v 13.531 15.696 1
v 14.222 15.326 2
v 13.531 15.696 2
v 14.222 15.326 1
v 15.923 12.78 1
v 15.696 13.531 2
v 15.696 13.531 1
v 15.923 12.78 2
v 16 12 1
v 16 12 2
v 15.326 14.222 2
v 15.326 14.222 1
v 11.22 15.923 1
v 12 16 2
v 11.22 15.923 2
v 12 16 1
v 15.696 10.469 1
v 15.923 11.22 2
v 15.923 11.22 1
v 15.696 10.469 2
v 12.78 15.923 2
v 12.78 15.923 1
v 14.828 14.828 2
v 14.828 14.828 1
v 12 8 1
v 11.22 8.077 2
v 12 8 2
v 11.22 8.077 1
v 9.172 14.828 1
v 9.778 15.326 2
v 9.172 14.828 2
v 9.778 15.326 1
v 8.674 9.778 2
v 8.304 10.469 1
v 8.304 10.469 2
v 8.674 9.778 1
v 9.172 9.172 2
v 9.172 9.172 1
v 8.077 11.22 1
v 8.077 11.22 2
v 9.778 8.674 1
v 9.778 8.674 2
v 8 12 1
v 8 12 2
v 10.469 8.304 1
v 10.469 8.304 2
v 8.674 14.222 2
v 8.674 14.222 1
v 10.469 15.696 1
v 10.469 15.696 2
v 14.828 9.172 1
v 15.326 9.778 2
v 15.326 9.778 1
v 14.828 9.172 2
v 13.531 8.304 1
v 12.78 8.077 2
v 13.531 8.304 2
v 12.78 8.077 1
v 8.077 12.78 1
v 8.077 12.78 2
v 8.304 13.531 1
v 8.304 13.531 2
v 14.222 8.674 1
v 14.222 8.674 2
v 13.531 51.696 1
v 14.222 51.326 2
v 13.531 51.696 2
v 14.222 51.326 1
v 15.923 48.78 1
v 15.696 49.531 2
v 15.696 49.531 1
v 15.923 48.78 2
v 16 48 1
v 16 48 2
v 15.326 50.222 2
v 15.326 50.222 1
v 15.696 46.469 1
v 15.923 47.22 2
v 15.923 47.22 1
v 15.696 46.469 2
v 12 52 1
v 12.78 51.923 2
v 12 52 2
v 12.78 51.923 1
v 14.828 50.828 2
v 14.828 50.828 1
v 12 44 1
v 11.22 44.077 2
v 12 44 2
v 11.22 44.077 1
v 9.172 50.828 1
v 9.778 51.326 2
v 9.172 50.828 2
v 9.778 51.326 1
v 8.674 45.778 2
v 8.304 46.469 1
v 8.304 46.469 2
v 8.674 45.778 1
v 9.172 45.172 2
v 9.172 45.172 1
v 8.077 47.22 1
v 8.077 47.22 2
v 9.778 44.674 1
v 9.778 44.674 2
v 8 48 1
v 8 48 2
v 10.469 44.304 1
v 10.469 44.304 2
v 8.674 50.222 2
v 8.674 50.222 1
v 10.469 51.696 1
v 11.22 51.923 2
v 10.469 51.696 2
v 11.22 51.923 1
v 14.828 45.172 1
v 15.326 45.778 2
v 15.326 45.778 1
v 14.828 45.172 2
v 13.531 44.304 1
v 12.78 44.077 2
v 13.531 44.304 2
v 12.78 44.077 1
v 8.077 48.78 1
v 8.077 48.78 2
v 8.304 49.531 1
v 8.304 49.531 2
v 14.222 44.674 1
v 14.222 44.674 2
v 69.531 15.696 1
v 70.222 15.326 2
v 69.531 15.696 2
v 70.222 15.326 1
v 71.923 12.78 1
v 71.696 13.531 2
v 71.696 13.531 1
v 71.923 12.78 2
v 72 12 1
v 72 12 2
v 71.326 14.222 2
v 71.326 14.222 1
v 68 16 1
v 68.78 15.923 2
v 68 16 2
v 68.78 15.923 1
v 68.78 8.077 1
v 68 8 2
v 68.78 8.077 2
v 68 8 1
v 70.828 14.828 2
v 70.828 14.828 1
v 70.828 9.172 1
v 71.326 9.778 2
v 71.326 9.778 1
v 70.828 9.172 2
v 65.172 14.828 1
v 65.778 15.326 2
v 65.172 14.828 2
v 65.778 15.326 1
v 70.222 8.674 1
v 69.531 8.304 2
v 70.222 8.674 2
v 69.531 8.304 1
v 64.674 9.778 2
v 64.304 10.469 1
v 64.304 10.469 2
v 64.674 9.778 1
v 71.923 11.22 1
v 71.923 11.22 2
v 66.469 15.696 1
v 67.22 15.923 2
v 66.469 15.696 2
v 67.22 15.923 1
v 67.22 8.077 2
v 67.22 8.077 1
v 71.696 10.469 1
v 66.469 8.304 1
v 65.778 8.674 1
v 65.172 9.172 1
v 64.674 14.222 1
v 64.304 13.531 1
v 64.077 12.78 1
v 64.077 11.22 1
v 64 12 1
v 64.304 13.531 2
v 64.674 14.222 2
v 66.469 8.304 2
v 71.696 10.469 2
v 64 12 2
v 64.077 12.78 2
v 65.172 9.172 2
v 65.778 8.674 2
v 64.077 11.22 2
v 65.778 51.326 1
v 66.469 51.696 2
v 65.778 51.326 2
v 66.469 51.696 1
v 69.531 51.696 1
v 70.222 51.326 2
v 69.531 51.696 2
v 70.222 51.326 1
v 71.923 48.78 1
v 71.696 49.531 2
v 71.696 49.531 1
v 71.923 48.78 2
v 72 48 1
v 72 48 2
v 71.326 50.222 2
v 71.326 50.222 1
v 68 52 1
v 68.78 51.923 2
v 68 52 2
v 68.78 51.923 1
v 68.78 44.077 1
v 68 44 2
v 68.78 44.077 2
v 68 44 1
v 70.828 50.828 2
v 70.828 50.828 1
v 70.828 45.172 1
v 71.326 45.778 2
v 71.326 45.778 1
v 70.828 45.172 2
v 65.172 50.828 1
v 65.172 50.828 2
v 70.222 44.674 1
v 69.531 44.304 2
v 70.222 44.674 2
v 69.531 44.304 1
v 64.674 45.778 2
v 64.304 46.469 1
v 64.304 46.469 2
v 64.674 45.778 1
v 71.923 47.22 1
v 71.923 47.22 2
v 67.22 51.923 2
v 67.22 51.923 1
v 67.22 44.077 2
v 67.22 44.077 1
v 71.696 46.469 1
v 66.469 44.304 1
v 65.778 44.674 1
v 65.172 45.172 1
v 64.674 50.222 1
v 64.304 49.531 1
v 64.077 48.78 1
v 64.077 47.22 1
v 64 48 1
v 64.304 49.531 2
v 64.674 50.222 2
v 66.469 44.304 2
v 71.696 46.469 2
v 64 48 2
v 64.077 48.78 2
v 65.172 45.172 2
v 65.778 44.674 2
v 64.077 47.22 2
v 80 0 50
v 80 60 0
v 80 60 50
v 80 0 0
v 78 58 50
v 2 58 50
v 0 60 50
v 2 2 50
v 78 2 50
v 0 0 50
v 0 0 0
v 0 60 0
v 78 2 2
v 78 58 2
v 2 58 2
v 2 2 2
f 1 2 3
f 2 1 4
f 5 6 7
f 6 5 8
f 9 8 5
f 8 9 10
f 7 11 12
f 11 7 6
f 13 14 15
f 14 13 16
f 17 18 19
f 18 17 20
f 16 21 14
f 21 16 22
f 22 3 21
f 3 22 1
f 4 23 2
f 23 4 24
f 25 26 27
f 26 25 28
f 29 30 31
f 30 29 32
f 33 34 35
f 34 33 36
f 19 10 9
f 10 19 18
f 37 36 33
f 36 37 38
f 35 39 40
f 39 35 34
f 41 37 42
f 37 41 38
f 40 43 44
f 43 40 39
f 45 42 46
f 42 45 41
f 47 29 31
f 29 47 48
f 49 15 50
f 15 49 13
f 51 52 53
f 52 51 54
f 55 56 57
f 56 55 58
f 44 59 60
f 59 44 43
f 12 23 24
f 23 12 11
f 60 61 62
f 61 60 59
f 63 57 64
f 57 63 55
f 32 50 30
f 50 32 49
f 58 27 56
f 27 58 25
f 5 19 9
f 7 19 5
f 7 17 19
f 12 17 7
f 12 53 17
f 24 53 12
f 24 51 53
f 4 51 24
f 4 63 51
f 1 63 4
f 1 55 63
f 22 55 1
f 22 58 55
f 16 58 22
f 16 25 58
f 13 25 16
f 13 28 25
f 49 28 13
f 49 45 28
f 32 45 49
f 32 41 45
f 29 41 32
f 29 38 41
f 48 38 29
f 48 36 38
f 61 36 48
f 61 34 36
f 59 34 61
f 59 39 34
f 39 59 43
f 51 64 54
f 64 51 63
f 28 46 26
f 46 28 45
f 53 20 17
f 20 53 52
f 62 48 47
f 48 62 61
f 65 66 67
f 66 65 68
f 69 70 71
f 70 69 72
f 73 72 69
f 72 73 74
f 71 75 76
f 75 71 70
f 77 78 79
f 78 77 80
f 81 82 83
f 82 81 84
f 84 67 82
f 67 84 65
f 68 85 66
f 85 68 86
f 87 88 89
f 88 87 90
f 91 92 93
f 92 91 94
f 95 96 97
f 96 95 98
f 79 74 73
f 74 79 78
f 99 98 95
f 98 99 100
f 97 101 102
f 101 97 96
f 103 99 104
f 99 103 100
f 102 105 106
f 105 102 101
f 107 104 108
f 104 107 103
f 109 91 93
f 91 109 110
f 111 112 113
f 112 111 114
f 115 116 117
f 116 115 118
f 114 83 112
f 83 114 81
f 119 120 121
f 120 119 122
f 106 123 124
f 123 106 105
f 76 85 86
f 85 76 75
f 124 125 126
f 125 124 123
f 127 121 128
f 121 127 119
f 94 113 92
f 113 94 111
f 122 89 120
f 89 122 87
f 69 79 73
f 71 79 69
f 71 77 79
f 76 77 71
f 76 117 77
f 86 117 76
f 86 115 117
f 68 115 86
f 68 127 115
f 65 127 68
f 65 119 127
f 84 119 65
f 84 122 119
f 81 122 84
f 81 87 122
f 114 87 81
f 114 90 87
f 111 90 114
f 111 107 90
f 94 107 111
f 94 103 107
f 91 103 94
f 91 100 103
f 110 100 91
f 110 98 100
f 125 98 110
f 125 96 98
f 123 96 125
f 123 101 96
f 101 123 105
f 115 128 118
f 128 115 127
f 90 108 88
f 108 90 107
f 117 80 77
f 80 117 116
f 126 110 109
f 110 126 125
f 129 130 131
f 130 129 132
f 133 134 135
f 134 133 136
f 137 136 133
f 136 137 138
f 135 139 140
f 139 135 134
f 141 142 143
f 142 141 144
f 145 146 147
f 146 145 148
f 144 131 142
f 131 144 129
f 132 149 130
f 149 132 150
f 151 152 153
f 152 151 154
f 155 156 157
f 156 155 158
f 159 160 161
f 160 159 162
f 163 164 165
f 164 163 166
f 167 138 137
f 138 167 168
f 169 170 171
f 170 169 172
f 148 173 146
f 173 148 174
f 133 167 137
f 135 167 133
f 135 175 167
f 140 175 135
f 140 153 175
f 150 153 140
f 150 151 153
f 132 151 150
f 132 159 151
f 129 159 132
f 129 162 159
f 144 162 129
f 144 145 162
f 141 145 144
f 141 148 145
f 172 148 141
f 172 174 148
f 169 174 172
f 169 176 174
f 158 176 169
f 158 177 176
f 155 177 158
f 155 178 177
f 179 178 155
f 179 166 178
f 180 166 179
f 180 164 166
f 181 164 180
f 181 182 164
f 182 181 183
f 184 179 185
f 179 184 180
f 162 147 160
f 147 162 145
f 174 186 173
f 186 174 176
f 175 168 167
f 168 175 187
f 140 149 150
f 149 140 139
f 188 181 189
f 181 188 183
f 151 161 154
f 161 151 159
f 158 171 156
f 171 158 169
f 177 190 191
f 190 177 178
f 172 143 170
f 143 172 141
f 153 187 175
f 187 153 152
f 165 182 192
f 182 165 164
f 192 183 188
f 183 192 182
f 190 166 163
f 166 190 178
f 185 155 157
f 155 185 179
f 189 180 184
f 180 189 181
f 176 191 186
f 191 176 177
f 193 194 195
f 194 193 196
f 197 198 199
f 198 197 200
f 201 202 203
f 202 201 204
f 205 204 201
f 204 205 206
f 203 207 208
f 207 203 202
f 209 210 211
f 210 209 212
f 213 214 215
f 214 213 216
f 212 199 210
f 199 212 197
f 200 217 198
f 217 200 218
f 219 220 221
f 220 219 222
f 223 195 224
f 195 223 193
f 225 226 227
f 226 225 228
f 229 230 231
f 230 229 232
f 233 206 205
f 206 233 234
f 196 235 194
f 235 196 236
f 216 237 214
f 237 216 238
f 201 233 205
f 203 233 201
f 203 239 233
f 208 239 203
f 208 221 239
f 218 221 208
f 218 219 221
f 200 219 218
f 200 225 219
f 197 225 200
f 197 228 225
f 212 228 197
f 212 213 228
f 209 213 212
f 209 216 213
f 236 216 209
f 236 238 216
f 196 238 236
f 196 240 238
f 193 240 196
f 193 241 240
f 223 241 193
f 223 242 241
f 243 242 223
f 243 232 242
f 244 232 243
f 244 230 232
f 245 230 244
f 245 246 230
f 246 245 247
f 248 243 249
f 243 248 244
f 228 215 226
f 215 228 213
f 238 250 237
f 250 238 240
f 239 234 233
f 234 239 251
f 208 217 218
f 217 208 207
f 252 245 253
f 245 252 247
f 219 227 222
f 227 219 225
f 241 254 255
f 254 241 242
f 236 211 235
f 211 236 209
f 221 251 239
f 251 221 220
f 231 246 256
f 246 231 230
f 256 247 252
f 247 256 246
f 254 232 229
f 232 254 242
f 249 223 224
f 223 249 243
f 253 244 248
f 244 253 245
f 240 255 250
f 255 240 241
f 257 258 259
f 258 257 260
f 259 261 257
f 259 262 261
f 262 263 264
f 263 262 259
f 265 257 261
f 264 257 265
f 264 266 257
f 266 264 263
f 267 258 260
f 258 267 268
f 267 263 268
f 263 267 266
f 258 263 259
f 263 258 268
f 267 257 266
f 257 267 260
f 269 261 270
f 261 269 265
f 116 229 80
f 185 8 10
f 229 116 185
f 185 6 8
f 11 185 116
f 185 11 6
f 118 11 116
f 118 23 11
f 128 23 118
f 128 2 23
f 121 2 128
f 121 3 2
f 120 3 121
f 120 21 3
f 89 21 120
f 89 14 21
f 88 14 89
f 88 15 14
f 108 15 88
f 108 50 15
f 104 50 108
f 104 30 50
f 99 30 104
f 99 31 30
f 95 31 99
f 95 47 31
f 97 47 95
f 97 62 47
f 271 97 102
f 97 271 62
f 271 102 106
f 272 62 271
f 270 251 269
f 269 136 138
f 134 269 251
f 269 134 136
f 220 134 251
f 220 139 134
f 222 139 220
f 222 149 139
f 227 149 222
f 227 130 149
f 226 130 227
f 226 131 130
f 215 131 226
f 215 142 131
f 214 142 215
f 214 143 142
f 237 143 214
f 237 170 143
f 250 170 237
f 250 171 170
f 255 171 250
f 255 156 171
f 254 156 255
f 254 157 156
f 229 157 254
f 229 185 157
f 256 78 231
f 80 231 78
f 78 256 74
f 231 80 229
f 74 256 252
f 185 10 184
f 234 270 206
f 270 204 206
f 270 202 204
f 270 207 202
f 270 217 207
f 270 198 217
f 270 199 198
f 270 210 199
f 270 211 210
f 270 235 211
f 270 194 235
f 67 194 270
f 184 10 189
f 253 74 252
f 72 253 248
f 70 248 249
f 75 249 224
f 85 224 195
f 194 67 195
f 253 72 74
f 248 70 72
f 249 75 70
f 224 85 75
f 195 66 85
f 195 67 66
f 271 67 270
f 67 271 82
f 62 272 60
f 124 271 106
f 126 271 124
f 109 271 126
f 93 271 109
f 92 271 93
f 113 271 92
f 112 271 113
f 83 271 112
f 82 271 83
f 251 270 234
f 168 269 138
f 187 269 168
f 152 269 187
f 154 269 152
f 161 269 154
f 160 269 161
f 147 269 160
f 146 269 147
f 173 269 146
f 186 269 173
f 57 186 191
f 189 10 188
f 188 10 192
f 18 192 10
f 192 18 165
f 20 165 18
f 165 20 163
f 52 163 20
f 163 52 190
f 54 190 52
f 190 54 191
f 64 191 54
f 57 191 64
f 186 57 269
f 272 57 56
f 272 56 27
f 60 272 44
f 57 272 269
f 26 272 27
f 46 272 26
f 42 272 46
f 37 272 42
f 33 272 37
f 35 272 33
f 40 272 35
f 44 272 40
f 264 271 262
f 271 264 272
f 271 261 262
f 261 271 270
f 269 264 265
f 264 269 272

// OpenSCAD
$fn = 32;

// ----------------------------------------------------------------------
// Enclosure box: bosses enclosure
// ----------------------------------------------------------------------

// --- parameters (mm) ---
box_l = 80;               // outer length, X
box_w = 60;               // outer width, Y
box_h = 50;               // outer height
wall_t = 2;               // wall thickness
boss_r = 4;               // corner boss radius
hole_r = 1.5;             // boss screw hole radius
boss_in = 12;             // boss inset from the corners

inner_h = box_h - wall_t;  // cavity depth
boss_h = inner_h - 2;  // corner boss height

difference() {
  cube([box_l, box_w, box_h]);
  translate([wall_t, wall_t, wall_t])
    cube([box_l - 2 * wall_t, box_w - 2 * wall_t, box_h]);
  for (sx = [0, 1], sy = [0, 1])
    translate([sx ? box_l - boss_in : boss_in,
               sy ? box_w - boss_in : boss_in, wall_t - 1]) {
      cylinder(r = boss_r, h = boss_h);
      translate([0, 0, boss_h - 4])
        cylinder(r = hole_r, h = 5);
    }
}
